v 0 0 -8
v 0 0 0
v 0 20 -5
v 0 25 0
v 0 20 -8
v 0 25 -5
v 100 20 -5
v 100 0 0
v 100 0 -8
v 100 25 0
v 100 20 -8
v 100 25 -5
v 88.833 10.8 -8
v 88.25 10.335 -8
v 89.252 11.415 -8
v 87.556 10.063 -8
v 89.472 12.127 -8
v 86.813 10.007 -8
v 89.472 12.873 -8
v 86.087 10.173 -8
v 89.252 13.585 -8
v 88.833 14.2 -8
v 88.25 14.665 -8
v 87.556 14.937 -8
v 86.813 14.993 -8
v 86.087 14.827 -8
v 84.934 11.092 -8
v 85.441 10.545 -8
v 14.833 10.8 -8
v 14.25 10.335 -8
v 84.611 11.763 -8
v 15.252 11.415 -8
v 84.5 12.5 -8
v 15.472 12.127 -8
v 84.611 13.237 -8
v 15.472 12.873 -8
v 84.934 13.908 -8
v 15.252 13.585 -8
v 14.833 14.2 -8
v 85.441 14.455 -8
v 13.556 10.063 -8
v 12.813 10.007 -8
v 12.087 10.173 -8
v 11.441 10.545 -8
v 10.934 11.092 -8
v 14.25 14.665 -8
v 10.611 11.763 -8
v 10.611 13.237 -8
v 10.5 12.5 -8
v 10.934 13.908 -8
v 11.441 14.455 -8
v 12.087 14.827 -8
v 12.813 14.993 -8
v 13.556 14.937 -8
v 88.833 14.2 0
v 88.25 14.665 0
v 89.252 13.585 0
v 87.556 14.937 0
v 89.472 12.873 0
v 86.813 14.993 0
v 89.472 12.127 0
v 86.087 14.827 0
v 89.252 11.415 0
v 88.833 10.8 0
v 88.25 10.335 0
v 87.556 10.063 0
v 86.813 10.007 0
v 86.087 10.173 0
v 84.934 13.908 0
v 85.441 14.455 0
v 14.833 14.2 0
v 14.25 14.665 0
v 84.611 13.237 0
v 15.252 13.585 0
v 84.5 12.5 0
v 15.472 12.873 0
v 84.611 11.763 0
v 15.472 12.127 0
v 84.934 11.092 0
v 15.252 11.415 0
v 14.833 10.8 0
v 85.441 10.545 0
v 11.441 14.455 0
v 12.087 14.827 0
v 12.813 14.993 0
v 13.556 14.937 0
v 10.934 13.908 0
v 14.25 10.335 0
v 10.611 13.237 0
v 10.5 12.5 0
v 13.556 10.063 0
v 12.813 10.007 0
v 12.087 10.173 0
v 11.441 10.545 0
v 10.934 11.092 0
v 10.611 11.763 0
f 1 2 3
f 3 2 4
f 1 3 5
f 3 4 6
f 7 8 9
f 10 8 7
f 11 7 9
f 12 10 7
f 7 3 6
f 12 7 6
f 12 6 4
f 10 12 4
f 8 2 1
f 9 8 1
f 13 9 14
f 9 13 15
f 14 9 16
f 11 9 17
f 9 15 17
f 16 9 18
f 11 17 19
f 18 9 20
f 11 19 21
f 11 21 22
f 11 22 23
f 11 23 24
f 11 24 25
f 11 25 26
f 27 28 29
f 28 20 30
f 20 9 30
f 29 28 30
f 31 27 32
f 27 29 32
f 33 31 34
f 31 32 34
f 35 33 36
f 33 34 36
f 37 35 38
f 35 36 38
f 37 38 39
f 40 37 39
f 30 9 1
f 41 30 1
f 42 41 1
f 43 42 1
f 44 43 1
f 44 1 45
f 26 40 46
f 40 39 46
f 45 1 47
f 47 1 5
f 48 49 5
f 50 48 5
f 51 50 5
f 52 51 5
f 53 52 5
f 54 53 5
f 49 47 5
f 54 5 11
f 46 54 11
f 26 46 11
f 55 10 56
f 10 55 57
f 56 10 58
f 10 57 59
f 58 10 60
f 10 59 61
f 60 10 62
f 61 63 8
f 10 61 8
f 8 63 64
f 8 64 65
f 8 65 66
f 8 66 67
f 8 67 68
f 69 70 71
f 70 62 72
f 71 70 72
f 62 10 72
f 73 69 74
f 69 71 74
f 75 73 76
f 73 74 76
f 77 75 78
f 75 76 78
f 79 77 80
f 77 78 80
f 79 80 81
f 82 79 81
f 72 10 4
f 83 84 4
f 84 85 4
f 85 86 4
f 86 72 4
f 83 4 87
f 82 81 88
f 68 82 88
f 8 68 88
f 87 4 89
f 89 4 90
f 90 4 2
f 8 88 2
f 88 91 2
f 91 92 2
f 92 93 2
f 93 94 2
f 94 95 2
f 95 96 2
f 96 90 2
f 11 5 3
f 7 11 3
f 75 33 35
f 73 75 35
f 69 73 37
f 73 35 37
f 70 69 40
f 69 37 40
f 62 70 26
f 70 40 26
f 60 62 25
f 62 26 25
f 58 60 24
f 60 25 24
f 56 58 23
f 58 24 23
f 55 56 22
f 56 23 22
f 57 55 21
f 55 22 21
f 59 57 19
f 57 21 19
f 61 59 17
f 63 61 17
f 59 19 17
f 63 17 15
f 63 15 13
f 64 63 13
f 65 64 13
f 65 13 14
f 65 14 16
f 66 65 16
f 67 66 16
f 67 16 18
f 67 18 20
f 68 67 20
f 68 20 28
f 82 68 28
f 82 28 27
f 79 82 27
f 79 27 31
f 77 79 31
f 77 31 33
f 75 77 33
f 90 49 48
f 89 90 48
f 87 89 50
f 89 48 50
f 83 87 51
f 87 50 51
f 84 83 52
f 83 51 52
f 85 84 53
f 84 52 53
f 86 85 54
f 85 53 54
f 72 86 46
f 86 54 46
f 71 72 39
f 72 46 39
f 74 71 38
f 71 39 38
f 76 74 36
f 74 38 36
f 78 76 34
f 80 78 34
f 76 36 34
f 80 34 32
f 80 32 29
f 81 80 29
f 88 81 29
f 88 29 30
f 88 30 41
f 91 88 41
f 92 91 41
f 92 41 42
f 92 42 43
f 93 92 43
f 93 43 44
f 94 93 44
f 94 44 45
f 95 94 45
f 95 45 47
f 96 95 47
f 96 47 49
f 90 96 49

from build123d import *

# Parameters (mm, degrees)
BOSS_EXTRUDE1_DEPTH         = 100
TAP_DRILL_FOR_M6X1_0_TAP1_D = 5


with BuildPart() as part:
    # Sketch1 → Boss-Extrude1 (new body)
    with BuildSketch(Plane(origin=(0, 0, 0), x_dir=(0, 0, -1), z_dir=(1, 0, 0))):
        Polygon((0, 25), (0, 0), (8, 0), (8, 20), (5, 20), (5, 25), align=None)
    extrude(amount=BOSS_EXTRUDE1_DEPTH)

    # Tap Drill for M6x1.0 Tap1 (through all)
    with Locations(Plane(origin=(87, 12.5, 0), x_dir=(1, 0, 0), z_dir=(0, 0, 1))):
        with Locations((0, 0), (-74, 0)):
            Hole(TAP_DRILL_FOR_M6X1_0_TAP1_D / 2)


solid = part.part
